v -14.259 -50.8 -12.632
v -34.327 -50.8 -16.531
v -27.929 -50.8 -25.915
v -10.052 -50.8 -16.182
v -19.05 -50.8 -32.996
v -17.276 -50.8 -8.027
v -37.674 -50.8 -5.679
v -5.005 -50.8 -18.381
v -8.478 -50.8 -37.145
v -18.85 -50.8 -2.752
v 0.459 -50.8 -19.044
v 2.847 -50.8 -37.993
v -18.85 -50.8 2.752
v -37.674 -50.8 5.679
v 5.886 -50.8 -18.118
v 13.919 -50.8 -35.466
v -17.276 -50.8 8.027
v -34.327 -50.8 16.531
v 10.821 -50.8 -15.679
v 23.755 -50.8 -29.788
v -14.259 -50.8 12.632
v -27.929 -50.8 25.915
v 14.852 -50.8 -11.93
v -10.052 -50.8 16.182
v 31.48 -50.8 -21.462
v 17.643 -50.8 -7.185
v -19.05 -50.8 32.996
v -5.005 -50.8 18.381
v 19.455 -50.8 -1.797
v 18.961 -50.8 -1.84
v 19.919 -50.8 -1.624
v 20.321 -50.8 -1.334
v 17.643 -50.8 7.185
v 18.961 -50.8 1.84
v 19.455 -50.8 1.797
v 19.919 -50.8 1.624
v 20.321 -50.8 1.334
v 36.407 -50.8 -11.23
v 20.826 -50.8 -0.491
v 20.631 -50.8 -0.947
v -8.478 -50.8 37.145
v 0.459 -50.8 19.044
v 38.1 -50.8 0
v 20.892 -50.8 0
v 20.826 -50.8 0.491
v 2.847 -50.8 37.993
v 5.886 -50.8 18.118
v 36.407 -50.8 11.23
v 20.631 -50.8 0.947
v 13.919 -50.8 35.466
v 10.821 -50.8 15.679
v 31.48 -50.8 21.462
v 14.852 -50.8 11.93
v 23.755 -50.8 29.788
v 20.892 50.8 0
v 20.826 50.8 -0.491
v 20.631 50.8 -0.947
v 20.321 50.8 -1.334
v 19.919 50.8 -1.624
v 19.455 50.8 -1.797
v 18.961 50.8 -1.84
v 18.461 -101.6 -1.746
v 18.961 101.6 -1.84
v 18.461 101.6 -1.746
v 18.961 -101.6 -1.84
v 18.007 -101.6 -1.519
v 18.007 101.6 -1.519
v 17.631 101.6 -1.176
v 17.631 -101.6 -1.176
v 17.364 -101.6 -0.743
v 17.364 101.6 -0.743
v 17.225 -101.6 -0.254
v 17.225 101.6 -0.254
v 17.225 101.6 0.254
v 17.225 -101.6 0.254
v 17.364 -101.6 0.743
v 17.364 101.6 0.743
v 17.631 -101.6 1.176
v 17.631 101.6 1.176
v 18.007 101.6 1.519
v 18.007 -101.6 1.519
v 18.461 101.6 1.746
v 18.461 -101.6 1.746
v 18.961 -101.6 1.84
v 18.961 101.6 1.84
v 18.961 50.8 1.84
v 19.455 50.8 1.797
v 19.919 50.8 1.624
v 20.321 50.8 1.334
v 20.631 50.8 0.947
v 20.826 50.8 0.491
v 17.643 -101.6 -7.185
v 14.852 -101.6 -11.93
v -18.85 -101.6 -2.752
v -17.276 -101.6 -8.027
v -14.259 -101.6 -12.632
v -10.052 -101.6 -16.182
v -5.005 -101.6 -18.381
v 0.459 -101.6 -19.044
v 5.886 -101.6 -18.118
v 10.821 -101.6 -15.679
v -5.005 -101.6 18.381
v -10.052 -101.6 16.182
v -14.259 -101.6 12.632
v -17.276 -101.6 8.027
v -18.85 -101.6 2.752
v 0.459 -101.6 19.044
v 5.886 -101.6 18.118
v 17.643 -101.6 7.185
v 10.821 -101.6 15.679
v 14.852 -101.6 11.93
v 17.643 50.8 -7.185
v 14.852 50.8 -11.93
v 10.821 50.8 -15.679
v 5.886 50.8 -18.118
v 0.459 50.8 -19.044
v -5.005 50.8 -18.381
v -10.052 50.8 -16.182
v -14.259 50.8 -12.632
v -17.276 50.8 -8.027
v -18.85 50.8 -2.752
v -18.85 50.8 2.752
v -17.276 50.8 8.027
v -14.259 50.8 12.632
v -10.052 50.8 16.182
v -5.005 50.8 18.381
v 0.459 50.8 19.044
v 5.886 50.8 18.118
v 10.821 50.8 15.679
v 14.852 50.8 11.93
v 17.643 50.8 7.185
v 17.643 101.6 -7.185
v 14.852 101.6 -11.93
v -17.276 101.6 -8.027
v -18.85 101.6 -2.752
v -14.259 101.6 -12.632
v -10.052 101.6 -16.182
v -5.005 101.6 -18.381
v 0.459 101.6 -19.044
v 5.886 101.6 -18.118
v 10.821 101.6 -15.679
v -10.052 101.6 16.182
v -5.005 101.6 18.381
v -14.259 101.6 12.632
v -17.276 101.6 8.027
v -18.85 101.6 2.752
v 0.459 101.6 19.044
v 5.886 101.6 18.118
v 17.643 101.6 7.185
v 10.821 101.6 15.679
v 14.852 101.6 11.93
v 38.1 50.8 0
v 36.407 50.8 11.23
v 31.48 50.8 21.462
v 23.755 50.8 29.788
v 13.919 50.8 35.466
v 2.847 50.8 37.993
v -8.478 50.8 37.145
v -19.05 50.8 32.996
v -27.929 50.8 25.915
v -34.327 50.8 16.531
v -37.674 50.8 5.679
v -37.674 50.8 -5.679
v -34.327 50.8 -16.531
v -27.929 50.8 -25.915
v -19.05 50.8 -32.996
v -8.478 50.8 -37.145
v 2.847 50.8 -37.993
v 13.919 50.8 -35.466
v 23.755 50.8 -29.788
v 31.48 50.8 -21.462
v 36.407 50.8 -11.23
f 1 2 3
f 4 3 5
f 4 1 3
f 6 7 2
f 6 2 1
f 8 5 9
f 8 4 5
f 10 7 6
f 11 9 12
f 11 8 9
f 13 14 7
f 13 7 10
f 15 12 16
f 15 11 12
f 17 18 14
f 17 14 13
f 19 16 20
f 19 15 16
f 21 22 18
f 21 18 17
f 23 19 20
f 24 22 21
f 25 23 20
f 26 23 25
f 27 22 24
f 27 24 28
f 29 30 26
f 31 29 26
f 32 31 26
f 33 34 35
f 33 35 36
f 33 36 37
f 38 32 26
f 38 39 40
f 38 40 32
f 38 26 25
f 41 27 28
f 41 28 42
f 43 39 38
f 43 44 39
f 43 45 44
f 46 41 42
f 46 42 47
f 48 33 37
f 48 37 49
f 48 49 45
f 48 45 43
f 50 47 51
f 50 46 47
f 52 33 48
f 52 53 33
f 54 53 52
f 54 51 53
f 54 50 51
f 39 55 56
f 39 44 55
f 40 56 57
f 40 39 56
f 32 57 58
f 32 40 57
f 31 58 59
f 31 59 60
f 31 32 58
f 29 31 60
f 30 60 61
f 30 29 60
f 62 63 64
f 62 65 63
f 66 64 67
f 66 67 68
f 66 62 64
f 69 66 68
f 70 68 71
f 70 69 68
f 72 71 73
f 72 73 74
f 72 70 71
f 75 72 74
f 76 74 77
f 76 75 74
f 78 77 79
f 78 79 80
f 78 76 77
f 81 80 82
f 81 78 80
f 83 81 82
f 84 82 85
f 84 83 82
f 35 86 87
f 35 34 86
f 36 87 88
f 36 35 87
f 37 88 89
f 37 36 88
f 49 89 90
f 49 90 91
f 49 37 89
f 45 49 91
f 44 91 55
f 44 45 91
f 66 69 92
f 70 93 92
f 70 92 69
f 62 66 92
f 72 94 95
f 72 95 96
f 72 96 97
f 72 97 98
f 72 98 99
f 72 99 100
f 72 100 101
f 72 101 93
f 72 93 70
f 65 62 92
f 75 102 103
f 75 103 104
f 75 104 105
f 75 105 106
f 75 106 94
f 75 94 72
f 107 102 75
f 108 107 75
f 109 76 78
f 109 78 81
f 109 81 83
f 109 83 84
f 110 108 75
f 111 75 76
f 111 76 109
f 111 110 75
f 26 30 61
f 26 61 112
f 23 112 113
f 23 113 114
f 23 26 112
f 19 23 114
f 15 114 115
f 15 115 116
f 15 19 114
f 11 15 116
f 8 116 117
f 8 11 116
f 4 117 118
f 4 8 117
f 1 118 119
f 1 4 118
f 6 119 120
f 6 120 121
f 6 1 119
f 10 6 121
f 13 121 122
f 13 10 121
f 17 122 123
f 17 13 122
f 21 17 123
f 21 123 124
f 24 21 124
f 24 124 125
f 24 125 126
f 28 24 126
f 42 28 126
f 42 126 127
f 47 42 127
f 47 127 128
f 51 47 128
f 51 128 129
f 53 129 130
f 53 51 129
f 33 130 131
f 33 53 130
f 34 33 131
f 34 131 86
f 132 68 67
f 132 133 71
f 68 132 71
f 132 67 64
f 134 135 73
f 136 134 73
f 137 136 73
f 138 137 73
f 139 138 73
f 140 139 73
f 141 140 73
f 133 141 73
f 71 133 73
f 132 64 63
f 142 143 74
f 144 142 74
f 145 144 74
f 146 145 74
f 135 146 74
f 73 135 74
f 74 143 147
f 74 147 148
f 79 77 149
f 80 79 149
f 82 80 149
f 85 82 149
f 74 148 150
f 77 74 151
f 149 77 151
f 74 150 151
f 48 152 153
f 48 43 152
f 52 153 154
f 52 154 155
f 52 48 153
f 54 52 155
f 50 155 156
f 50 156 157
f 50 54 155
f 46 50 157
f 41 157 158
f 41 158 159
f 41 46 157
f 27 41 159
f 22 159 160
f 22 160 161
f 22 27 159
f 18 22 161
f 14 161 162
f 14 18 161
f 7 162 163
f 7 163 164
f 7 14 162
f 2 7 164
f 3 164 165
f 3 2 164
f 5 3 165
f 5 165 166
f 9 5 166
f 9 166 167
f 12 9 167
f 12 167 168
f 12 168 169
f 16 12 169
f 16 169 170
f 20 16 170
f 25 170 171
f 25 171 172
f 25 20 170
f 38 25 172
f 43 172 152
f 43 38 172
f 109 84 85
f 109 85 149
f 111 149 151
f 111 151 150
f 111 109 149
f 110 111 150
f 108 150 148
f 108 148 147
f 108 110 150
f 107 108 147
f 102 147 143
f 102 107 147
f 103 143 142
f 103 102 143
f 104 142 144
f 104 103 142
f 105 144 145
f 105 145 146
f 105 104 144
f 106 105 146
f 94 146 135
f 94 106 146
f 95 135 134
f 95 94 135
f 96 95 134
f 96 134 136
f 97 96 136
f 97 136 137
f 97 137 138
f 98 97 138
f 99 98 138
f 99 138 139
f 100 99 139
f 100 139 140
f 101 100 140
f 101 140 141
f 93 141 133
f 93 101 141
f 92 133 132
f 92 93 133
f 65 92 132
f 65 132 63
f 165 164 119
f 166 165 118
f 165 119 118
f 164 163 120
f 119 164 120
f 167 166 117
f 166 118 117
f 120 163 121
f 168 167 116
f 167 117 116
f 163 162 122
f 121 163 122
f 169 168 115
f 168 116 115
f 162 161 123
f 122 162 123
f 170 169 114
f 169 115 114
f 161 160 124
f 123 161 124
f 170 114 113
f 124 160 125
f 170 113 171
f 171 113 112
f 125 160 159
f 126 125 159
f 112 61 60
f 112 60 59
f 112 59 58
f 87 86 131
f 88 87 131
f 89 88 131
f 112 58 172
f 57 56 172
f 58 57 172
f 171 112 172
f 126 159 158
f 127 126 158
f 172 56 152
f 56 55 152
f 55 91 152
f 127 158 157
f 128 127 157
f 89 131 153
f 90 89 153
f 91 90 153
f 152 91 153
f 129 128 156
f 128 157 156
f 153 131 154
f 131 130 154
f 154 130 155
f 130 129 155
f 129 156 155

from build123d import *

# Parameters (mm, degrees)
F0_R     = 38.1
F1_DEPTH = 50.8
F2_DEPTH = 101.6


with BuildPart() as f1:
    # F0 (on Front) → F1 (new body, symmetric)
    with BuildSketch(Plane.XZ):
        Circle(F0_R)
        with BuildLine():
            ThreePointArc((18.960904, -1.840275), (-19.05, 0), (18.960904, 1.840275))
            ThreePointArc((18.960904, 1.840275), (20.320905, 1.333924), (20.892431, 0))
            ThreePointArc((20.892431, 0), (20.320905, -1.333924), (18.960904, -1.840275))
        make_face(mode=Mode.SUBTRACT)
    extrude(amount=F1_DEPTH, both=True)


with BuildPart() as f2:
    # F0 (on Front) → F2 (new body, symmetric)
    with BuildSketch(Plane.XZ):
        with BuildLine():
            ThreePointArc((18.960904, -1.840275), (17.207569, 0), (18.960904, 1.840275))
            ThreePointArc((18.960904, 1.840275), (-19.05, 0), (18.960904, -1.840275))
        make_face()
    extrude(amount=F2_DEPTH, both=True)


solid = Compound([f1.part, f2.part])
